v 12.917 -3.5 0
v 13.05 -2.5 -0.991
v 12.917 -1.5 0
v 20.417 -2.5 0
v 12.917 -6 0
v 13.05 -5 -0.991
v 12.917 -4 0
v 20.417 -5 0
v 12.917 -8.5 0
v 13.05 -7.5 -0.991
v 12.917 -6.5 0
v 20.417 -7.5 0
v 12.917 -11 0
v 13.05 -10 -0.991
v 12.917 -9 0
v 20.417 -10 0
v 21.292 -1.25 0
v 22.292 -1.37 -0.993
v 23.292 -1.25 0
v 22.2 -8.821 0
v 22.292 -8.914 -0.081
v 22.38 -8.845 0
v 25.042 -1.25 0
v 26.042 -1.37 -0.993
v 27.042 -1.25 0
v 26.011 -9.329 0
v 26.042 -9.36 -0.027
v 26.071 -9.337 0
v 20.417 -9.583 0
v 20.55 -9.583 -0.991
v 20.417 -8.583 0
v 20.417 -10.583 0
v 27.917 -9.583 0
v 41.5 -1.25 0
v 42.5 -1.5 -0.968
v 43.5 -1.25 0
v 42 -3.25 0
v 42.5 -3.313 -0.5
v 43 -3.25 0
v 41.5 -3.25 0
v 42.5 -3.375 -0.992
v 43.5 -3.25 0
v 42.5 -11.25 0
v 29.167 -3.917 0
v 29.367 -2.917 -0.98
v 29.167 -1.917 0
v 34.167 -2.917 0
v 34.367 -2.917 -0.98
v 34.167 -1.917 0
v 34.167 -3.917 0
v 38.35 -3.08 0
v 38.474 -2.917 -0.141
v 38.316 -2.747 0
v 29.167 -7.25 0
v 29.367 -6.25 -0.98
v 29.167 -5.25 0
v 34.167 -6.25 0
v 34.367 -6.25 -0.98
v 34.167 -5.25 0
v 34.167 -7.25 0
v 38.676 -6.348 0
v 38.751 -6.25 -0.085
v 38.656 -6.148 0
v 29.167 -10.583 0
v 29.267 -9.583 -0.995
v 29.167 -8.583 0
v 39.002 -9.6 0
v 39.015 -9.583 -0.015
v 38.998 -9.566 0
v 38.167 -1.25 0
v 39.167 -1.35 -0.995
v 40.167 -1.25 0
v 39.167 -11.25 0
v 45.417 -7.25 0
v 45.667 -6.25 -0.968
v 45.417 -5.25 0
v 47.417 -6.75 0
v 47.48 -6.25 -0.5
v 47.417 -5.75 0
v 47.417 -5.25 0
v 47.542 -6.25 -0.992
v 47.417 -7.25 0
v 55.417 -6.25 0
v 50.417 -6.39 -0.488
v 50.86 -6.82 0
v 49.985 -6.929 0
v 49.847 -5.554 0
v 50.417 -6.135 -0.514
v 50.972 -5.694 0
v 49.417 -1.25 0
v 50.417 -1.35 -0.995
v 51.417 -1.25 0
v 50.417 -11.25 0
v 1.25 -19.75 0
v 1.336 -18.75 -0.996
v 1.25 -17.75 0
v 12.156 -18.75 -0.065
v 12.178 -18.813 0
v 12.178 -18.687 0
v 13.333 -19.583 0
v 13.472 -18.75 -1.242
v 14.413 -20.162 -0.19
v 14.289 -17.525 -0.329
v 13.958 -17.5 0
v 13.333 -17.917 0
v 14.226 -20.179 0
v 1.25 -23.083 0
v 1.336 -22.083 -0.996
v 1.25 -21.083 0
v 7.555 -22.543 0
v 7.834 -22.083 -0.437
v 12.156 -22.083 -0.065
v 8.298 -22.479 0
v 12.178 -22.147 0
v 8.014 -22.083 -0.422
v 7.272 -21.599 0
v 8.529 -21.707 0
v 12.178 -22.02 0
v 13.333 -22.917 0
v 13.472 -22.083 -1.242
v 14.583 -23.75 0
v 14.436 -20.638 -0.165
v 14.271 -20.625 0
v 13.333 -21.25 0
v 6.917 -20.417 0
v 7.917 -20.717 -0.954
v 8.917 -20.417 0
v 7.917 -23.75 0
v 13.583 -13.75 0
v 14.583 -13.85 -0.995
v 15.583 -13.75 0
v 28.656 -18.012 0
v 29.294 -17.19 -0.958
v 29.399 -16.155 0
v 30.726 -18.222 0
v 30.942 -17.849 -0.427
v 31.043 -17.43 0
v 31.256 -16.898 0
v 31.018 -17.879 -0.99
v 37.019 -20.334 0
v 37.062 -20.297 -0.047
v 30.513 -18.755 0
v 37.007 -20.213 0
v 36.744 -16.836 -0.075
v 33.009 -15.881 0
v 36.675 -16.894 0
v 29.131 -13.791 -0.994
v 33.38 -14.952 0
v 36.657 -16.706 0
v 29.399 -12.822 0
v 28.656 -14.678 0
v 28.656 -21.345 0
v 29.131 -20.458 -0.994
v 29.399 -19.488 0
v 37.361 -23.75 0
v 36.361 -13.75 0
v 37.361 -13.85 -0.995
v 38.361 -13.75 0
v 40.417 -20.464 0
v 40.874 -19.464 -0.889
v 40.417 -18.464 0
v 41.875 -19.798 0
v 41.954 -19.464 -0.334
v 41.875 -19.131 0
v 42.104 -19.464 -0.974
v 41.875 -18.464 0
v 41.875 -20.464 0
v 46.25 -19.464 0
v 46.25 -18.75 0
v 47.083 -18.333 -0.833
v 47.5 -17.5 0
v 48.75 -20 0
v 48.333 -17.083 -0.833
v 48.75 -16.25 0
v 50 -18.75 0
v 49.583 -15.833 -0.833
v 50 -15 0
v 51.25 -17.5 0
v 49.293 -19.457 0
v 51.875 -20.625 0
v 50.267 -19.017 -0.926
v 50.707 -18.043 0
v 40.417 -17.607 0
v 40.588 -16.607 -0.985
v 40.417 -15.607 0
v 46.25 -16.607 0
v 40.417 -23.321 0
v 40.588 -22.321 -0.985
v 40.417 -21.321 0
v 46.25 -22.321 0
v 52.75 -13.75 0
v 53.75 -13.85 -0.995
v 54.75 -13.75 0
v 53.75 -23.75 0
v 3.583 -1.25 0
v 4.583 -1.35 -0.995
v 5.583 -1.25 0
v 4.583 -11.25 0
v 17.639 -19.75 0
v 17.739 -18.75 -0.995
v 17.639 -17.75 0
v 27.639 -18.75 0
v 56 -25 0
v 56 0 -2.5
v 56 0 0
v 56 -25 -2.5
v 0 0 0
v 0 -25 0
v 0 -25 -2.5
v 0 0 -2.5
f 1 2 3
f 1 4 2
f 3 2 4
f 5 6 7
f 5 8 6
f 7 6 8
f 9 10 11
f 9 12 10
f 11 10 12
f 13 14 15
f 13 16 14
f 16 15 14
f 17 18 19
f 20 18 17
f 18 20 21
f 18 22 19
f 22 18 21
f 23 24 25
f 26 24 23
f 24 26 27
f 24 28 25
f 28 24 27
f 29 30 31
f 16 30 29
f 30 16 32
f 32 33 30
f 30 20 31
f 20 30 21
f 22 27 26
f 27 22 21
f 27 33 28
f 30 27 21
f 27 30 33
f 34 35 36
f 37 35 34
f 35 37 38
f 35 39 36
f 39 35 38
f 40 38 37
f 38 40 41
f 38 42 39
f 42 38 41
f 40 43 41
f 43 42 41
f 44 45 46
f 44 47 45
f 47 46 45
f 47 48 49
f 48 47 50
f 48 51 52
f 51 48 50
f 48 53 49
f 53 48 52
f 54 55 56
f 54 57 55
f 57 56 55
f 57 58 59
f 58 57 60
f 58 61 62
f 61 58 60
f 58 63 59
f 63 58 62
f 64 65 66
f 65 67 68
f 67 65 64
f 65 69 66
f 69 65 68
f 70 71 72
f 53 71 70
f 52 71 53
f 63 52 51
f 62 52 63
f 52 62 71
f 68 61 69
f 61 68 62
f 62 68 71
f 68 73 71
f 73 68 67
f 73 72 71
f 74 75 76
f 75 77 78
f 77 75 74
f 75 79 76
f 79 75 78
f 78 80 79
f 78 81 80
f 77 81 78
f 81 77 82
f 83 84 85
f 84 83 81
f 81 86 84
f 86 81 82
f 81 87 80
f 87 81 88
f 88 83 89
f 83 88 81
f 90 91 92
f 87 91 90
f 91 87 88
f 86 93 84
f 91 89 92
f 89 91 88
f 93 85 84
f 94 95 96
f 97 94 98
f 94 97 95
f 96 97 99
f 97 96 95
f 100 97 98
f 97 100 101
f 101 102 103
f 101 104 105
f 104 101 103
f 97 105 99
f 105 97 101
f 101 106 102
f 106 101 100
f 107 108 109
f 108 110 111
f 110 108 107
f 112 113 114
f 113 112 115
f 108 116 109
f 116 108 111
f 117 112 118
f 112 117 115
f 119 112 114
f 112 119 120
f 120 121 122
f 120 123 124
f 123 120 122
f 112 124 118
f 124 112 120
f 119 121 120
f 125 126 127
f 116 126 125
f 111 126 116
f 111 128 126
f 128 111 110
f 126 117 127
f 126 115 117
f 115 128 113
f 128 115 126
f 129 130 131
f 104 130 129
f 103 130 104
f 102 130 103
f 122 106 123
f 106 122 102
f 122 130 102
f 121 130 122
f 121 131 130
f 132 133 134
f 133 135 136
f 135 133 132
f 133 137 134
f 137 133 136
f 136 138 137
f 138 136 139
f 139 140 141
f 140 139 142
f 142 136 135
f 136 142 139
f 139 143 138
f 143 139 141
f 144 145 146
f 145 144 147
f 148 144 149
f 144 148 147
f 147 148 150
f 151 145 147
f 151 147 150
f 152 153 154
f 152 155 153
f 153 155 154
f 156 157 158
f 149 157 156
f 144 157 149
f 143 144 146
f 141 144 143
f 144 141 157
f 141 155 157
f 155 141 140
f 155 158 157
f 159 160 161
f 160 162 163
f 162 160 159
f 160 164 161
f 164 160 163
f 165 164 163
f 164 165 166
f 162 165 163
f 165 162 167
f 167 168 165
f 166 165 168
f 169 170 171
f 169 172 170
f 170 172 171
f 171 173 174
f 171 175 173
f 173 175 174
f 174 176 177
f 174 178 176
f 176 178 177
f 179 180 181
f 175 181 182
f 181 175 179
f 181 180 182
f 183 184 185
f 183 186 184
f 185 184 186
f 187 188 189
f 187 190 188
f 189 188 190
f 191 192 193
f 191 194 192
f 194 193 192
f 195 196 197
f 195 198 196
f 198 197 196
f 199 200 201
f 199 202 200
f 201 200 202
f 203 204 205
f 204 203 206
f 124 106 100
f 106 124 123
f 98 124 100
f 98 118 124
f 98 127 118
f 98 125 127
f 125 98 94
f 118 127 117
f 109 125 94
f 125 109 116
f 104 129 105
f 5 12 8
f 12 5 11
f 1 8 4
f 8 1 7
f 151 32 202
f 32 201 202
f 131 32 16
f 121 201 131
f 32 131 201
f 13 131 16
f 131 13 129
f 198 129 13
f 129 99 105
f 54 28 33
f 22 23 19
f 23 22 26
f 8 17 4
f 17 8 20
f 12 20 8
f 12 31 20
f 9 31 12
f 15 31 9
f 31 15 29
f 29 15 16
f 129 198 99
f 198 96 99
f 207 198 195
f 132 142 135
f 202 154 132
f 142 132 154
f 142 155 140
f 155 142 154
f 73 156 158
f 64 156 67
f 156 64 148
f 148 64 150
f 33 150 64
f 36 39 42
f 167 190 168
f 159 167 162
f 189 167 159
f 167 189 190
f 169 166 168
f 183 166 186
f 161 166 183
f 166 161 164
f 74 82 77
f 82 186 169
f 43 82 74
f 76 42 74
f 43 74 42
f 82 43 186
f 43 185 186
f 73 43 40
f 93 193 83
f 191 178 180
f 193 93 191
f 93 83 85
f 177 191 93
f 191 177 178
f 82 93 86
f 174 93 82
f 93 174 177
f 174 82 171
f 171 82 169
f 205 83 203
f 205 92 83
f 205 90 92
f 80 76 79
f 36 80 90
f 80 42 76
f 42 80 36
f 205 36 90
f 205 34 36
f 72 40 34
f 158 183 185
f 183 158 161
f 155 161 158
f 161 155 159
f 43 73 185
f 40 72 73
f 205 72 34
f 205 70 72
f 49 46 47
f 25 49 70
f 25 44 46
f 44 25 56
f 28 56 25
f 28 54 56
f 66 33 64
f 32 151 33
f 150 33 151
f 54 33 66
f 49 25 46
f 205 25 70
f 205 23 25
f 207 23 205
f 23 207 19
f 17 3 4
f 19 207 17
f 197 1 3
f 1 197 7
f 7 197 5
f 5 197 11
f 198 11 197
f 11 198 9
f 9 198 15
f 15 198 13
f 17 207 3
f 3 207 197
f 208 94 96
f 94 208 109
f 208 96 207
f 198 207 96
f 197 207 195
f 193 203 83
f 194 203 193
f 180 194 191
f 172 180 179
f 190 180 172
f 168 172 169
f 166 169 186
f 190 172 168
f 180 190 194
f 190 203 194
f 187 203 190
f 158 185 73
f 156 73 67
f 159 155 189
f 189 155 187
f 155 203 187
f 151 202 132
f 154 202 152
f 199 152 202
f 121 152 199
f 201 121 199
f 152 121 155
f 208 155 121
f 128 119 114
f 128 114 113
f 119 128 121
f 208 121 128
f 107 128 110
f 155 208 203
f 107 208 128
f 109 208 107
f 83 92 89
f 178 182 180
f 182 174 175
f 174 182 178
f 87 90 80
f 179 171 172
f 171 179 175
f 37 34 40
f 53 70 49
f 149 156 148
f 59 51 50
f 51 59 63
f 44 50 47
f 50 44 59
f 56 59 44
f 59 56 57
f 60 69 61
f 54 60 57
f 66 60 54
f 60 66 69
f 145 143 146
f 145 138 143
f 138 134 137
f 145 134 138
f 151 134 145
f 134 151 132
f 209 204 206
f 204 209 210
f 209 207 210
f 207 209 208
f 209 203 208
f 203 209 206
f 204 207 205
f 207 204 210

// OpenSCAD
// file: cuneiform.scad
MAX_STROKE_WIDTH = 1/5;

module wedge(x, y, z, w, h, phi, o=false){
	// o is for offset, an experiment with moving the stroke so that its greatest depth would be at the origin point
	// It's not working very well; just don't use it for now
	// Also need to extend the stroke by delta if we do that
	
	s = w / sqrt(2);
	d = w / 2; // Depth of stroke, from head to deepest point
	l = sqrt(h*h - d*d); // Length of stroke, from deepest point to tip
	theta = atan(d/l); // Angle of stylus
	delta = o ? d*sin(theta) : 0; // Horizontal distance from head of wedge to greatest depth

	translate([x, y, z])
	rotate([0, 0, phi])
	translate([-delta, 0, 0])
	rotate([0, -theta, 0])
	rotate([45, 0, 0])
	translate([0, -s/2, -s/2])
	cube([l, s, s]);
}

module haken(x, y, z, s, d){
	w = s*sqrt(2);
	theta = atan(d/(w/2));
	translate([x, y, z])
	rotate([0, -theta, 0])
	translate([0, 0, -d])
	rotate([0, 0, -45])
	cube([s, s, d]);
}

module singlestroke(x, y, w, h){ // Vertical, positioned from top left corner
	w2 = min(h, w, MAX_STROKE_WIDTH);
	wedge(x+w/2, y, 0, w2, h, 90);
}

module doublestroke(x, y, w, h){
	w2 = min(h, w, MAX_STROKE_WIDTH);
	dist = min(w2, h/4);
	h2 = h - dist;
	h3 = h2 / 2;
	wedge(x+w/2, y, 0, w2, h3, 90);
	wedge(x+w/2, y+dist, 0, w2, h2, 90);
}

module triplestroke(x, y, w, h){
	w2 = min(h, w, MAX_STROKE_WIDTH);
	dist = min(w2, h/4);
	h2 = h - dist*2;
	h3 = min(h2/2, h-dist*2);
	wedge(x+w/2, y, 0, w2, h3, 90);
	wedge(x+w/2, y+dist, 0, w2, h3, 90);
	wedge(x+w/2, y+dist*2, 0, w2, h2, 90);
}

module hookstroke(x, y, w, h, factor=0.75){
//	hh = (w-h/2<0.0001) ? factor*h : h; // By default, the renderer produces hakens that are twice as tall as they are wide - but that means d = 0!
	// We fix this by reducing h by a factor < 1, when this happens
	// Comparing against epsilon instead of zero because transferring numbers from Python to SCAD can do weird things occasionally
	// Experiment: changing w instead of h to make hakens wider, which makes them more visible when they're pressed against verticals
	// Experiment undone - it works better changing h and having an adjustment in the renderer for when it's pressed against a vertical
//	ww = (w-h/2<0.0001) ? w/factor : w;
	ww = w;
	hh = (w-h/2<0.0001) ? h*factor : h;
	s = hh / sqrt(2);
	d = sqrt(ww*ww - hh*hh/4);
	deltaw = (ww-w);
	haken(x-deltaw, y+h/2, 0, s, d); // Use h instead of hh because the haken() module wants the position of the tip, and that needs to be at the midpoint of the *original* bounding box
}

module hrule(y, w, h=0.05){
	s = h*sqrt(2)/2;
	translate([0, y, -s])
		rotate([45, 0, 0])
			cube([w, h, h]);
}

module hatcharea(x, y, w, h){
	// TODO
}
// main file
use <../3dmodel/cuneiform.scad>

scale([1,-1,1]){
	difference(){
		translate([0,0,-2.5])
			cube([56,25,2.5]);
		union(){
			translate([1.25,1.25,0]){
				scale([10.0,10.0,10.0]){
					translate([0,0,0]){
						singlestroke(0.16666666666666666, 0, 0.3333333333333333, 1);
					}
					translate([1.1666666666666665,0,0]){
						rotate(-90.0){
							singlestroke(-0.25, 0.0, 0.25, 0.75);
						}
						rotate(-90.0){
							singlestroke(-0.5, 0.0, 0.25, 0.75);
						}
						rotate(-90.0){
							singlestroke(-0.75, 0.0, 0.25, 0.75);
						}
						rotate(-90.0){
							singlestroke(-1.0, 0.0, 0.25, 0.75);
						}
						singlestroke(0.7708333333333334, 0, 0.3333333333333333, 0.8333333333333333);
						singlestroke(1.1458333333333333, 0, 0.3333333333333333, 0.8333333333333333);
						rotate(-90.0){
							singlestroke(-1.0, 0.75, 0.3333333333333333, 0.75);
						}
					}
					translate([2.7916666666666665,0,0]){
						rotate(-90.0){
							singlestroke(-0.3333333333333333, 0.0, 0.3333333333333333, 0.5);
						}
						rotate(-90.0){
							singlestroke(-0.3333333333333333, 0.5, 0.3333333333333333, 0.5);
						}
						rotate(-90.0){
							singlestroke(-0.6666666666666666, 0.0, 0.3333333333333333, 0.5);
						}
						rotate(-90.0){
							singlestroke(-0.6666666666666666, 0.5, 0.3333333333333333, 0.5);
						}
						rotate(-90.0){
							singlestroke(-1.0, 0, 0.3333333333333333, 1.0);
						}
						singlestroke(0.8333333333333334, 0, 0.3333333333333333, 1);
						doublestroke(1.1666666666666665, 0, 0.3333333333333333, 1);
					}
					translate([4.416666666666666,0,0]){
						rotate(-90.0){
							doublestroke(-0.6666666666666667, 0, 0.3333333333333333, 1);
						}
						singlestroke(0.33333333333333337, 0, 0.3333333333333333, 1);
					}
					translate([0,1.25,0]){
						rotate(-90.0){
							singlestroke(-0.6666666666666666, 0, 0.3333333333333333, 1.1666666666666665);
						}
						hookstroke(1.0833333333333333, 0.3333333333333333, 0.25, 0.3333333333333333);
						rotate(-90.0){
							singlestroke(-1.0, 0, 0.3333333333333333, 1.1666666666666665);
						}
						hookstroke(1.0833333333333333, 0.6666666666666666, 0.25, 0.3333333333333333);
						singlestroke(0.5, 0.6666666666666666, 0.3333333333333333, 0.3333333333333333);
						singlestroke(1.1666666666666665, 0, 0.3333333333333333, 1);
					}
					translate([1.6388888888888886,1.25,0]){
						rotate(-90.0){
							singlestroke(-0.6666666666666667, 0, 0.3333333333333333, 1);
						}
					}
					translate([2.7777777777777772,1.25,0]){
						translate([0,0.0,0]){
							rotate(-68.19859051364818){
								translate([-0.16666666666666666,0,0]){
									singlestroke(0, 0, 0.3333333333333333, 0.8975274678557505);
								}
							}
						}
						translate([0,0.3333333333333333,0]){
							rotate(-68.19859051364818){
								translate([-0.16666666666666666,0,0]){
									doublestroke(0, 0, 0.3333333333333333, 0.8975274678557505);
								}
							}
						}
						translate([0,0.6666666666666666,0]){
							rotate(-68.19859051364818){
								translate([-0.16666666666666666,0,0]){
									singlestroke(0, 0, 0.3333333333333333, 0.8975274678557505);
								}
							}
						}
						singlestroke(0.6666666666666666, 0, 0.3333333333333333, 1);
					}
					translate([3.916666666666666,1.25,0]){
						rotate(-90.0){
							singlestroke(-0.4285888671875, 0, 0.28570556640625, 0.5833333333333333);
						}
						rotate(-90.0){
							doublestroke(-0.71429443359375, 0, 0.28570556640625, 0.5833333333333333);
						}
						rotate(-90.0){
							singlestroke(-1.0, 0, 0.28570556640625, 0.5833333333333333);
						}
						translate([0.5833333333333333,0.5,0]){
							rotate(-45.0){
								singlestroke(0.0, 0.0, 0.1767766952966369, 0.26516504294495535);
								singlestroke(0.1767766952966369, 0.0, 0.1767766952966369, 0.26516504294495535);
								singlestroke(0.3535533905932738, 0.0, 0.1767766952966369, 0.26516504294495535);
								singlestroke(0.0984983762782887, 0.26516504294495535, 0.3333333333333333, 0.26516504294495535);
							}
						}
						singlestroke(1.1666666666666665, 0, 0.3333333333333333, 1);
					}
				}
			}
		}
	}
}
